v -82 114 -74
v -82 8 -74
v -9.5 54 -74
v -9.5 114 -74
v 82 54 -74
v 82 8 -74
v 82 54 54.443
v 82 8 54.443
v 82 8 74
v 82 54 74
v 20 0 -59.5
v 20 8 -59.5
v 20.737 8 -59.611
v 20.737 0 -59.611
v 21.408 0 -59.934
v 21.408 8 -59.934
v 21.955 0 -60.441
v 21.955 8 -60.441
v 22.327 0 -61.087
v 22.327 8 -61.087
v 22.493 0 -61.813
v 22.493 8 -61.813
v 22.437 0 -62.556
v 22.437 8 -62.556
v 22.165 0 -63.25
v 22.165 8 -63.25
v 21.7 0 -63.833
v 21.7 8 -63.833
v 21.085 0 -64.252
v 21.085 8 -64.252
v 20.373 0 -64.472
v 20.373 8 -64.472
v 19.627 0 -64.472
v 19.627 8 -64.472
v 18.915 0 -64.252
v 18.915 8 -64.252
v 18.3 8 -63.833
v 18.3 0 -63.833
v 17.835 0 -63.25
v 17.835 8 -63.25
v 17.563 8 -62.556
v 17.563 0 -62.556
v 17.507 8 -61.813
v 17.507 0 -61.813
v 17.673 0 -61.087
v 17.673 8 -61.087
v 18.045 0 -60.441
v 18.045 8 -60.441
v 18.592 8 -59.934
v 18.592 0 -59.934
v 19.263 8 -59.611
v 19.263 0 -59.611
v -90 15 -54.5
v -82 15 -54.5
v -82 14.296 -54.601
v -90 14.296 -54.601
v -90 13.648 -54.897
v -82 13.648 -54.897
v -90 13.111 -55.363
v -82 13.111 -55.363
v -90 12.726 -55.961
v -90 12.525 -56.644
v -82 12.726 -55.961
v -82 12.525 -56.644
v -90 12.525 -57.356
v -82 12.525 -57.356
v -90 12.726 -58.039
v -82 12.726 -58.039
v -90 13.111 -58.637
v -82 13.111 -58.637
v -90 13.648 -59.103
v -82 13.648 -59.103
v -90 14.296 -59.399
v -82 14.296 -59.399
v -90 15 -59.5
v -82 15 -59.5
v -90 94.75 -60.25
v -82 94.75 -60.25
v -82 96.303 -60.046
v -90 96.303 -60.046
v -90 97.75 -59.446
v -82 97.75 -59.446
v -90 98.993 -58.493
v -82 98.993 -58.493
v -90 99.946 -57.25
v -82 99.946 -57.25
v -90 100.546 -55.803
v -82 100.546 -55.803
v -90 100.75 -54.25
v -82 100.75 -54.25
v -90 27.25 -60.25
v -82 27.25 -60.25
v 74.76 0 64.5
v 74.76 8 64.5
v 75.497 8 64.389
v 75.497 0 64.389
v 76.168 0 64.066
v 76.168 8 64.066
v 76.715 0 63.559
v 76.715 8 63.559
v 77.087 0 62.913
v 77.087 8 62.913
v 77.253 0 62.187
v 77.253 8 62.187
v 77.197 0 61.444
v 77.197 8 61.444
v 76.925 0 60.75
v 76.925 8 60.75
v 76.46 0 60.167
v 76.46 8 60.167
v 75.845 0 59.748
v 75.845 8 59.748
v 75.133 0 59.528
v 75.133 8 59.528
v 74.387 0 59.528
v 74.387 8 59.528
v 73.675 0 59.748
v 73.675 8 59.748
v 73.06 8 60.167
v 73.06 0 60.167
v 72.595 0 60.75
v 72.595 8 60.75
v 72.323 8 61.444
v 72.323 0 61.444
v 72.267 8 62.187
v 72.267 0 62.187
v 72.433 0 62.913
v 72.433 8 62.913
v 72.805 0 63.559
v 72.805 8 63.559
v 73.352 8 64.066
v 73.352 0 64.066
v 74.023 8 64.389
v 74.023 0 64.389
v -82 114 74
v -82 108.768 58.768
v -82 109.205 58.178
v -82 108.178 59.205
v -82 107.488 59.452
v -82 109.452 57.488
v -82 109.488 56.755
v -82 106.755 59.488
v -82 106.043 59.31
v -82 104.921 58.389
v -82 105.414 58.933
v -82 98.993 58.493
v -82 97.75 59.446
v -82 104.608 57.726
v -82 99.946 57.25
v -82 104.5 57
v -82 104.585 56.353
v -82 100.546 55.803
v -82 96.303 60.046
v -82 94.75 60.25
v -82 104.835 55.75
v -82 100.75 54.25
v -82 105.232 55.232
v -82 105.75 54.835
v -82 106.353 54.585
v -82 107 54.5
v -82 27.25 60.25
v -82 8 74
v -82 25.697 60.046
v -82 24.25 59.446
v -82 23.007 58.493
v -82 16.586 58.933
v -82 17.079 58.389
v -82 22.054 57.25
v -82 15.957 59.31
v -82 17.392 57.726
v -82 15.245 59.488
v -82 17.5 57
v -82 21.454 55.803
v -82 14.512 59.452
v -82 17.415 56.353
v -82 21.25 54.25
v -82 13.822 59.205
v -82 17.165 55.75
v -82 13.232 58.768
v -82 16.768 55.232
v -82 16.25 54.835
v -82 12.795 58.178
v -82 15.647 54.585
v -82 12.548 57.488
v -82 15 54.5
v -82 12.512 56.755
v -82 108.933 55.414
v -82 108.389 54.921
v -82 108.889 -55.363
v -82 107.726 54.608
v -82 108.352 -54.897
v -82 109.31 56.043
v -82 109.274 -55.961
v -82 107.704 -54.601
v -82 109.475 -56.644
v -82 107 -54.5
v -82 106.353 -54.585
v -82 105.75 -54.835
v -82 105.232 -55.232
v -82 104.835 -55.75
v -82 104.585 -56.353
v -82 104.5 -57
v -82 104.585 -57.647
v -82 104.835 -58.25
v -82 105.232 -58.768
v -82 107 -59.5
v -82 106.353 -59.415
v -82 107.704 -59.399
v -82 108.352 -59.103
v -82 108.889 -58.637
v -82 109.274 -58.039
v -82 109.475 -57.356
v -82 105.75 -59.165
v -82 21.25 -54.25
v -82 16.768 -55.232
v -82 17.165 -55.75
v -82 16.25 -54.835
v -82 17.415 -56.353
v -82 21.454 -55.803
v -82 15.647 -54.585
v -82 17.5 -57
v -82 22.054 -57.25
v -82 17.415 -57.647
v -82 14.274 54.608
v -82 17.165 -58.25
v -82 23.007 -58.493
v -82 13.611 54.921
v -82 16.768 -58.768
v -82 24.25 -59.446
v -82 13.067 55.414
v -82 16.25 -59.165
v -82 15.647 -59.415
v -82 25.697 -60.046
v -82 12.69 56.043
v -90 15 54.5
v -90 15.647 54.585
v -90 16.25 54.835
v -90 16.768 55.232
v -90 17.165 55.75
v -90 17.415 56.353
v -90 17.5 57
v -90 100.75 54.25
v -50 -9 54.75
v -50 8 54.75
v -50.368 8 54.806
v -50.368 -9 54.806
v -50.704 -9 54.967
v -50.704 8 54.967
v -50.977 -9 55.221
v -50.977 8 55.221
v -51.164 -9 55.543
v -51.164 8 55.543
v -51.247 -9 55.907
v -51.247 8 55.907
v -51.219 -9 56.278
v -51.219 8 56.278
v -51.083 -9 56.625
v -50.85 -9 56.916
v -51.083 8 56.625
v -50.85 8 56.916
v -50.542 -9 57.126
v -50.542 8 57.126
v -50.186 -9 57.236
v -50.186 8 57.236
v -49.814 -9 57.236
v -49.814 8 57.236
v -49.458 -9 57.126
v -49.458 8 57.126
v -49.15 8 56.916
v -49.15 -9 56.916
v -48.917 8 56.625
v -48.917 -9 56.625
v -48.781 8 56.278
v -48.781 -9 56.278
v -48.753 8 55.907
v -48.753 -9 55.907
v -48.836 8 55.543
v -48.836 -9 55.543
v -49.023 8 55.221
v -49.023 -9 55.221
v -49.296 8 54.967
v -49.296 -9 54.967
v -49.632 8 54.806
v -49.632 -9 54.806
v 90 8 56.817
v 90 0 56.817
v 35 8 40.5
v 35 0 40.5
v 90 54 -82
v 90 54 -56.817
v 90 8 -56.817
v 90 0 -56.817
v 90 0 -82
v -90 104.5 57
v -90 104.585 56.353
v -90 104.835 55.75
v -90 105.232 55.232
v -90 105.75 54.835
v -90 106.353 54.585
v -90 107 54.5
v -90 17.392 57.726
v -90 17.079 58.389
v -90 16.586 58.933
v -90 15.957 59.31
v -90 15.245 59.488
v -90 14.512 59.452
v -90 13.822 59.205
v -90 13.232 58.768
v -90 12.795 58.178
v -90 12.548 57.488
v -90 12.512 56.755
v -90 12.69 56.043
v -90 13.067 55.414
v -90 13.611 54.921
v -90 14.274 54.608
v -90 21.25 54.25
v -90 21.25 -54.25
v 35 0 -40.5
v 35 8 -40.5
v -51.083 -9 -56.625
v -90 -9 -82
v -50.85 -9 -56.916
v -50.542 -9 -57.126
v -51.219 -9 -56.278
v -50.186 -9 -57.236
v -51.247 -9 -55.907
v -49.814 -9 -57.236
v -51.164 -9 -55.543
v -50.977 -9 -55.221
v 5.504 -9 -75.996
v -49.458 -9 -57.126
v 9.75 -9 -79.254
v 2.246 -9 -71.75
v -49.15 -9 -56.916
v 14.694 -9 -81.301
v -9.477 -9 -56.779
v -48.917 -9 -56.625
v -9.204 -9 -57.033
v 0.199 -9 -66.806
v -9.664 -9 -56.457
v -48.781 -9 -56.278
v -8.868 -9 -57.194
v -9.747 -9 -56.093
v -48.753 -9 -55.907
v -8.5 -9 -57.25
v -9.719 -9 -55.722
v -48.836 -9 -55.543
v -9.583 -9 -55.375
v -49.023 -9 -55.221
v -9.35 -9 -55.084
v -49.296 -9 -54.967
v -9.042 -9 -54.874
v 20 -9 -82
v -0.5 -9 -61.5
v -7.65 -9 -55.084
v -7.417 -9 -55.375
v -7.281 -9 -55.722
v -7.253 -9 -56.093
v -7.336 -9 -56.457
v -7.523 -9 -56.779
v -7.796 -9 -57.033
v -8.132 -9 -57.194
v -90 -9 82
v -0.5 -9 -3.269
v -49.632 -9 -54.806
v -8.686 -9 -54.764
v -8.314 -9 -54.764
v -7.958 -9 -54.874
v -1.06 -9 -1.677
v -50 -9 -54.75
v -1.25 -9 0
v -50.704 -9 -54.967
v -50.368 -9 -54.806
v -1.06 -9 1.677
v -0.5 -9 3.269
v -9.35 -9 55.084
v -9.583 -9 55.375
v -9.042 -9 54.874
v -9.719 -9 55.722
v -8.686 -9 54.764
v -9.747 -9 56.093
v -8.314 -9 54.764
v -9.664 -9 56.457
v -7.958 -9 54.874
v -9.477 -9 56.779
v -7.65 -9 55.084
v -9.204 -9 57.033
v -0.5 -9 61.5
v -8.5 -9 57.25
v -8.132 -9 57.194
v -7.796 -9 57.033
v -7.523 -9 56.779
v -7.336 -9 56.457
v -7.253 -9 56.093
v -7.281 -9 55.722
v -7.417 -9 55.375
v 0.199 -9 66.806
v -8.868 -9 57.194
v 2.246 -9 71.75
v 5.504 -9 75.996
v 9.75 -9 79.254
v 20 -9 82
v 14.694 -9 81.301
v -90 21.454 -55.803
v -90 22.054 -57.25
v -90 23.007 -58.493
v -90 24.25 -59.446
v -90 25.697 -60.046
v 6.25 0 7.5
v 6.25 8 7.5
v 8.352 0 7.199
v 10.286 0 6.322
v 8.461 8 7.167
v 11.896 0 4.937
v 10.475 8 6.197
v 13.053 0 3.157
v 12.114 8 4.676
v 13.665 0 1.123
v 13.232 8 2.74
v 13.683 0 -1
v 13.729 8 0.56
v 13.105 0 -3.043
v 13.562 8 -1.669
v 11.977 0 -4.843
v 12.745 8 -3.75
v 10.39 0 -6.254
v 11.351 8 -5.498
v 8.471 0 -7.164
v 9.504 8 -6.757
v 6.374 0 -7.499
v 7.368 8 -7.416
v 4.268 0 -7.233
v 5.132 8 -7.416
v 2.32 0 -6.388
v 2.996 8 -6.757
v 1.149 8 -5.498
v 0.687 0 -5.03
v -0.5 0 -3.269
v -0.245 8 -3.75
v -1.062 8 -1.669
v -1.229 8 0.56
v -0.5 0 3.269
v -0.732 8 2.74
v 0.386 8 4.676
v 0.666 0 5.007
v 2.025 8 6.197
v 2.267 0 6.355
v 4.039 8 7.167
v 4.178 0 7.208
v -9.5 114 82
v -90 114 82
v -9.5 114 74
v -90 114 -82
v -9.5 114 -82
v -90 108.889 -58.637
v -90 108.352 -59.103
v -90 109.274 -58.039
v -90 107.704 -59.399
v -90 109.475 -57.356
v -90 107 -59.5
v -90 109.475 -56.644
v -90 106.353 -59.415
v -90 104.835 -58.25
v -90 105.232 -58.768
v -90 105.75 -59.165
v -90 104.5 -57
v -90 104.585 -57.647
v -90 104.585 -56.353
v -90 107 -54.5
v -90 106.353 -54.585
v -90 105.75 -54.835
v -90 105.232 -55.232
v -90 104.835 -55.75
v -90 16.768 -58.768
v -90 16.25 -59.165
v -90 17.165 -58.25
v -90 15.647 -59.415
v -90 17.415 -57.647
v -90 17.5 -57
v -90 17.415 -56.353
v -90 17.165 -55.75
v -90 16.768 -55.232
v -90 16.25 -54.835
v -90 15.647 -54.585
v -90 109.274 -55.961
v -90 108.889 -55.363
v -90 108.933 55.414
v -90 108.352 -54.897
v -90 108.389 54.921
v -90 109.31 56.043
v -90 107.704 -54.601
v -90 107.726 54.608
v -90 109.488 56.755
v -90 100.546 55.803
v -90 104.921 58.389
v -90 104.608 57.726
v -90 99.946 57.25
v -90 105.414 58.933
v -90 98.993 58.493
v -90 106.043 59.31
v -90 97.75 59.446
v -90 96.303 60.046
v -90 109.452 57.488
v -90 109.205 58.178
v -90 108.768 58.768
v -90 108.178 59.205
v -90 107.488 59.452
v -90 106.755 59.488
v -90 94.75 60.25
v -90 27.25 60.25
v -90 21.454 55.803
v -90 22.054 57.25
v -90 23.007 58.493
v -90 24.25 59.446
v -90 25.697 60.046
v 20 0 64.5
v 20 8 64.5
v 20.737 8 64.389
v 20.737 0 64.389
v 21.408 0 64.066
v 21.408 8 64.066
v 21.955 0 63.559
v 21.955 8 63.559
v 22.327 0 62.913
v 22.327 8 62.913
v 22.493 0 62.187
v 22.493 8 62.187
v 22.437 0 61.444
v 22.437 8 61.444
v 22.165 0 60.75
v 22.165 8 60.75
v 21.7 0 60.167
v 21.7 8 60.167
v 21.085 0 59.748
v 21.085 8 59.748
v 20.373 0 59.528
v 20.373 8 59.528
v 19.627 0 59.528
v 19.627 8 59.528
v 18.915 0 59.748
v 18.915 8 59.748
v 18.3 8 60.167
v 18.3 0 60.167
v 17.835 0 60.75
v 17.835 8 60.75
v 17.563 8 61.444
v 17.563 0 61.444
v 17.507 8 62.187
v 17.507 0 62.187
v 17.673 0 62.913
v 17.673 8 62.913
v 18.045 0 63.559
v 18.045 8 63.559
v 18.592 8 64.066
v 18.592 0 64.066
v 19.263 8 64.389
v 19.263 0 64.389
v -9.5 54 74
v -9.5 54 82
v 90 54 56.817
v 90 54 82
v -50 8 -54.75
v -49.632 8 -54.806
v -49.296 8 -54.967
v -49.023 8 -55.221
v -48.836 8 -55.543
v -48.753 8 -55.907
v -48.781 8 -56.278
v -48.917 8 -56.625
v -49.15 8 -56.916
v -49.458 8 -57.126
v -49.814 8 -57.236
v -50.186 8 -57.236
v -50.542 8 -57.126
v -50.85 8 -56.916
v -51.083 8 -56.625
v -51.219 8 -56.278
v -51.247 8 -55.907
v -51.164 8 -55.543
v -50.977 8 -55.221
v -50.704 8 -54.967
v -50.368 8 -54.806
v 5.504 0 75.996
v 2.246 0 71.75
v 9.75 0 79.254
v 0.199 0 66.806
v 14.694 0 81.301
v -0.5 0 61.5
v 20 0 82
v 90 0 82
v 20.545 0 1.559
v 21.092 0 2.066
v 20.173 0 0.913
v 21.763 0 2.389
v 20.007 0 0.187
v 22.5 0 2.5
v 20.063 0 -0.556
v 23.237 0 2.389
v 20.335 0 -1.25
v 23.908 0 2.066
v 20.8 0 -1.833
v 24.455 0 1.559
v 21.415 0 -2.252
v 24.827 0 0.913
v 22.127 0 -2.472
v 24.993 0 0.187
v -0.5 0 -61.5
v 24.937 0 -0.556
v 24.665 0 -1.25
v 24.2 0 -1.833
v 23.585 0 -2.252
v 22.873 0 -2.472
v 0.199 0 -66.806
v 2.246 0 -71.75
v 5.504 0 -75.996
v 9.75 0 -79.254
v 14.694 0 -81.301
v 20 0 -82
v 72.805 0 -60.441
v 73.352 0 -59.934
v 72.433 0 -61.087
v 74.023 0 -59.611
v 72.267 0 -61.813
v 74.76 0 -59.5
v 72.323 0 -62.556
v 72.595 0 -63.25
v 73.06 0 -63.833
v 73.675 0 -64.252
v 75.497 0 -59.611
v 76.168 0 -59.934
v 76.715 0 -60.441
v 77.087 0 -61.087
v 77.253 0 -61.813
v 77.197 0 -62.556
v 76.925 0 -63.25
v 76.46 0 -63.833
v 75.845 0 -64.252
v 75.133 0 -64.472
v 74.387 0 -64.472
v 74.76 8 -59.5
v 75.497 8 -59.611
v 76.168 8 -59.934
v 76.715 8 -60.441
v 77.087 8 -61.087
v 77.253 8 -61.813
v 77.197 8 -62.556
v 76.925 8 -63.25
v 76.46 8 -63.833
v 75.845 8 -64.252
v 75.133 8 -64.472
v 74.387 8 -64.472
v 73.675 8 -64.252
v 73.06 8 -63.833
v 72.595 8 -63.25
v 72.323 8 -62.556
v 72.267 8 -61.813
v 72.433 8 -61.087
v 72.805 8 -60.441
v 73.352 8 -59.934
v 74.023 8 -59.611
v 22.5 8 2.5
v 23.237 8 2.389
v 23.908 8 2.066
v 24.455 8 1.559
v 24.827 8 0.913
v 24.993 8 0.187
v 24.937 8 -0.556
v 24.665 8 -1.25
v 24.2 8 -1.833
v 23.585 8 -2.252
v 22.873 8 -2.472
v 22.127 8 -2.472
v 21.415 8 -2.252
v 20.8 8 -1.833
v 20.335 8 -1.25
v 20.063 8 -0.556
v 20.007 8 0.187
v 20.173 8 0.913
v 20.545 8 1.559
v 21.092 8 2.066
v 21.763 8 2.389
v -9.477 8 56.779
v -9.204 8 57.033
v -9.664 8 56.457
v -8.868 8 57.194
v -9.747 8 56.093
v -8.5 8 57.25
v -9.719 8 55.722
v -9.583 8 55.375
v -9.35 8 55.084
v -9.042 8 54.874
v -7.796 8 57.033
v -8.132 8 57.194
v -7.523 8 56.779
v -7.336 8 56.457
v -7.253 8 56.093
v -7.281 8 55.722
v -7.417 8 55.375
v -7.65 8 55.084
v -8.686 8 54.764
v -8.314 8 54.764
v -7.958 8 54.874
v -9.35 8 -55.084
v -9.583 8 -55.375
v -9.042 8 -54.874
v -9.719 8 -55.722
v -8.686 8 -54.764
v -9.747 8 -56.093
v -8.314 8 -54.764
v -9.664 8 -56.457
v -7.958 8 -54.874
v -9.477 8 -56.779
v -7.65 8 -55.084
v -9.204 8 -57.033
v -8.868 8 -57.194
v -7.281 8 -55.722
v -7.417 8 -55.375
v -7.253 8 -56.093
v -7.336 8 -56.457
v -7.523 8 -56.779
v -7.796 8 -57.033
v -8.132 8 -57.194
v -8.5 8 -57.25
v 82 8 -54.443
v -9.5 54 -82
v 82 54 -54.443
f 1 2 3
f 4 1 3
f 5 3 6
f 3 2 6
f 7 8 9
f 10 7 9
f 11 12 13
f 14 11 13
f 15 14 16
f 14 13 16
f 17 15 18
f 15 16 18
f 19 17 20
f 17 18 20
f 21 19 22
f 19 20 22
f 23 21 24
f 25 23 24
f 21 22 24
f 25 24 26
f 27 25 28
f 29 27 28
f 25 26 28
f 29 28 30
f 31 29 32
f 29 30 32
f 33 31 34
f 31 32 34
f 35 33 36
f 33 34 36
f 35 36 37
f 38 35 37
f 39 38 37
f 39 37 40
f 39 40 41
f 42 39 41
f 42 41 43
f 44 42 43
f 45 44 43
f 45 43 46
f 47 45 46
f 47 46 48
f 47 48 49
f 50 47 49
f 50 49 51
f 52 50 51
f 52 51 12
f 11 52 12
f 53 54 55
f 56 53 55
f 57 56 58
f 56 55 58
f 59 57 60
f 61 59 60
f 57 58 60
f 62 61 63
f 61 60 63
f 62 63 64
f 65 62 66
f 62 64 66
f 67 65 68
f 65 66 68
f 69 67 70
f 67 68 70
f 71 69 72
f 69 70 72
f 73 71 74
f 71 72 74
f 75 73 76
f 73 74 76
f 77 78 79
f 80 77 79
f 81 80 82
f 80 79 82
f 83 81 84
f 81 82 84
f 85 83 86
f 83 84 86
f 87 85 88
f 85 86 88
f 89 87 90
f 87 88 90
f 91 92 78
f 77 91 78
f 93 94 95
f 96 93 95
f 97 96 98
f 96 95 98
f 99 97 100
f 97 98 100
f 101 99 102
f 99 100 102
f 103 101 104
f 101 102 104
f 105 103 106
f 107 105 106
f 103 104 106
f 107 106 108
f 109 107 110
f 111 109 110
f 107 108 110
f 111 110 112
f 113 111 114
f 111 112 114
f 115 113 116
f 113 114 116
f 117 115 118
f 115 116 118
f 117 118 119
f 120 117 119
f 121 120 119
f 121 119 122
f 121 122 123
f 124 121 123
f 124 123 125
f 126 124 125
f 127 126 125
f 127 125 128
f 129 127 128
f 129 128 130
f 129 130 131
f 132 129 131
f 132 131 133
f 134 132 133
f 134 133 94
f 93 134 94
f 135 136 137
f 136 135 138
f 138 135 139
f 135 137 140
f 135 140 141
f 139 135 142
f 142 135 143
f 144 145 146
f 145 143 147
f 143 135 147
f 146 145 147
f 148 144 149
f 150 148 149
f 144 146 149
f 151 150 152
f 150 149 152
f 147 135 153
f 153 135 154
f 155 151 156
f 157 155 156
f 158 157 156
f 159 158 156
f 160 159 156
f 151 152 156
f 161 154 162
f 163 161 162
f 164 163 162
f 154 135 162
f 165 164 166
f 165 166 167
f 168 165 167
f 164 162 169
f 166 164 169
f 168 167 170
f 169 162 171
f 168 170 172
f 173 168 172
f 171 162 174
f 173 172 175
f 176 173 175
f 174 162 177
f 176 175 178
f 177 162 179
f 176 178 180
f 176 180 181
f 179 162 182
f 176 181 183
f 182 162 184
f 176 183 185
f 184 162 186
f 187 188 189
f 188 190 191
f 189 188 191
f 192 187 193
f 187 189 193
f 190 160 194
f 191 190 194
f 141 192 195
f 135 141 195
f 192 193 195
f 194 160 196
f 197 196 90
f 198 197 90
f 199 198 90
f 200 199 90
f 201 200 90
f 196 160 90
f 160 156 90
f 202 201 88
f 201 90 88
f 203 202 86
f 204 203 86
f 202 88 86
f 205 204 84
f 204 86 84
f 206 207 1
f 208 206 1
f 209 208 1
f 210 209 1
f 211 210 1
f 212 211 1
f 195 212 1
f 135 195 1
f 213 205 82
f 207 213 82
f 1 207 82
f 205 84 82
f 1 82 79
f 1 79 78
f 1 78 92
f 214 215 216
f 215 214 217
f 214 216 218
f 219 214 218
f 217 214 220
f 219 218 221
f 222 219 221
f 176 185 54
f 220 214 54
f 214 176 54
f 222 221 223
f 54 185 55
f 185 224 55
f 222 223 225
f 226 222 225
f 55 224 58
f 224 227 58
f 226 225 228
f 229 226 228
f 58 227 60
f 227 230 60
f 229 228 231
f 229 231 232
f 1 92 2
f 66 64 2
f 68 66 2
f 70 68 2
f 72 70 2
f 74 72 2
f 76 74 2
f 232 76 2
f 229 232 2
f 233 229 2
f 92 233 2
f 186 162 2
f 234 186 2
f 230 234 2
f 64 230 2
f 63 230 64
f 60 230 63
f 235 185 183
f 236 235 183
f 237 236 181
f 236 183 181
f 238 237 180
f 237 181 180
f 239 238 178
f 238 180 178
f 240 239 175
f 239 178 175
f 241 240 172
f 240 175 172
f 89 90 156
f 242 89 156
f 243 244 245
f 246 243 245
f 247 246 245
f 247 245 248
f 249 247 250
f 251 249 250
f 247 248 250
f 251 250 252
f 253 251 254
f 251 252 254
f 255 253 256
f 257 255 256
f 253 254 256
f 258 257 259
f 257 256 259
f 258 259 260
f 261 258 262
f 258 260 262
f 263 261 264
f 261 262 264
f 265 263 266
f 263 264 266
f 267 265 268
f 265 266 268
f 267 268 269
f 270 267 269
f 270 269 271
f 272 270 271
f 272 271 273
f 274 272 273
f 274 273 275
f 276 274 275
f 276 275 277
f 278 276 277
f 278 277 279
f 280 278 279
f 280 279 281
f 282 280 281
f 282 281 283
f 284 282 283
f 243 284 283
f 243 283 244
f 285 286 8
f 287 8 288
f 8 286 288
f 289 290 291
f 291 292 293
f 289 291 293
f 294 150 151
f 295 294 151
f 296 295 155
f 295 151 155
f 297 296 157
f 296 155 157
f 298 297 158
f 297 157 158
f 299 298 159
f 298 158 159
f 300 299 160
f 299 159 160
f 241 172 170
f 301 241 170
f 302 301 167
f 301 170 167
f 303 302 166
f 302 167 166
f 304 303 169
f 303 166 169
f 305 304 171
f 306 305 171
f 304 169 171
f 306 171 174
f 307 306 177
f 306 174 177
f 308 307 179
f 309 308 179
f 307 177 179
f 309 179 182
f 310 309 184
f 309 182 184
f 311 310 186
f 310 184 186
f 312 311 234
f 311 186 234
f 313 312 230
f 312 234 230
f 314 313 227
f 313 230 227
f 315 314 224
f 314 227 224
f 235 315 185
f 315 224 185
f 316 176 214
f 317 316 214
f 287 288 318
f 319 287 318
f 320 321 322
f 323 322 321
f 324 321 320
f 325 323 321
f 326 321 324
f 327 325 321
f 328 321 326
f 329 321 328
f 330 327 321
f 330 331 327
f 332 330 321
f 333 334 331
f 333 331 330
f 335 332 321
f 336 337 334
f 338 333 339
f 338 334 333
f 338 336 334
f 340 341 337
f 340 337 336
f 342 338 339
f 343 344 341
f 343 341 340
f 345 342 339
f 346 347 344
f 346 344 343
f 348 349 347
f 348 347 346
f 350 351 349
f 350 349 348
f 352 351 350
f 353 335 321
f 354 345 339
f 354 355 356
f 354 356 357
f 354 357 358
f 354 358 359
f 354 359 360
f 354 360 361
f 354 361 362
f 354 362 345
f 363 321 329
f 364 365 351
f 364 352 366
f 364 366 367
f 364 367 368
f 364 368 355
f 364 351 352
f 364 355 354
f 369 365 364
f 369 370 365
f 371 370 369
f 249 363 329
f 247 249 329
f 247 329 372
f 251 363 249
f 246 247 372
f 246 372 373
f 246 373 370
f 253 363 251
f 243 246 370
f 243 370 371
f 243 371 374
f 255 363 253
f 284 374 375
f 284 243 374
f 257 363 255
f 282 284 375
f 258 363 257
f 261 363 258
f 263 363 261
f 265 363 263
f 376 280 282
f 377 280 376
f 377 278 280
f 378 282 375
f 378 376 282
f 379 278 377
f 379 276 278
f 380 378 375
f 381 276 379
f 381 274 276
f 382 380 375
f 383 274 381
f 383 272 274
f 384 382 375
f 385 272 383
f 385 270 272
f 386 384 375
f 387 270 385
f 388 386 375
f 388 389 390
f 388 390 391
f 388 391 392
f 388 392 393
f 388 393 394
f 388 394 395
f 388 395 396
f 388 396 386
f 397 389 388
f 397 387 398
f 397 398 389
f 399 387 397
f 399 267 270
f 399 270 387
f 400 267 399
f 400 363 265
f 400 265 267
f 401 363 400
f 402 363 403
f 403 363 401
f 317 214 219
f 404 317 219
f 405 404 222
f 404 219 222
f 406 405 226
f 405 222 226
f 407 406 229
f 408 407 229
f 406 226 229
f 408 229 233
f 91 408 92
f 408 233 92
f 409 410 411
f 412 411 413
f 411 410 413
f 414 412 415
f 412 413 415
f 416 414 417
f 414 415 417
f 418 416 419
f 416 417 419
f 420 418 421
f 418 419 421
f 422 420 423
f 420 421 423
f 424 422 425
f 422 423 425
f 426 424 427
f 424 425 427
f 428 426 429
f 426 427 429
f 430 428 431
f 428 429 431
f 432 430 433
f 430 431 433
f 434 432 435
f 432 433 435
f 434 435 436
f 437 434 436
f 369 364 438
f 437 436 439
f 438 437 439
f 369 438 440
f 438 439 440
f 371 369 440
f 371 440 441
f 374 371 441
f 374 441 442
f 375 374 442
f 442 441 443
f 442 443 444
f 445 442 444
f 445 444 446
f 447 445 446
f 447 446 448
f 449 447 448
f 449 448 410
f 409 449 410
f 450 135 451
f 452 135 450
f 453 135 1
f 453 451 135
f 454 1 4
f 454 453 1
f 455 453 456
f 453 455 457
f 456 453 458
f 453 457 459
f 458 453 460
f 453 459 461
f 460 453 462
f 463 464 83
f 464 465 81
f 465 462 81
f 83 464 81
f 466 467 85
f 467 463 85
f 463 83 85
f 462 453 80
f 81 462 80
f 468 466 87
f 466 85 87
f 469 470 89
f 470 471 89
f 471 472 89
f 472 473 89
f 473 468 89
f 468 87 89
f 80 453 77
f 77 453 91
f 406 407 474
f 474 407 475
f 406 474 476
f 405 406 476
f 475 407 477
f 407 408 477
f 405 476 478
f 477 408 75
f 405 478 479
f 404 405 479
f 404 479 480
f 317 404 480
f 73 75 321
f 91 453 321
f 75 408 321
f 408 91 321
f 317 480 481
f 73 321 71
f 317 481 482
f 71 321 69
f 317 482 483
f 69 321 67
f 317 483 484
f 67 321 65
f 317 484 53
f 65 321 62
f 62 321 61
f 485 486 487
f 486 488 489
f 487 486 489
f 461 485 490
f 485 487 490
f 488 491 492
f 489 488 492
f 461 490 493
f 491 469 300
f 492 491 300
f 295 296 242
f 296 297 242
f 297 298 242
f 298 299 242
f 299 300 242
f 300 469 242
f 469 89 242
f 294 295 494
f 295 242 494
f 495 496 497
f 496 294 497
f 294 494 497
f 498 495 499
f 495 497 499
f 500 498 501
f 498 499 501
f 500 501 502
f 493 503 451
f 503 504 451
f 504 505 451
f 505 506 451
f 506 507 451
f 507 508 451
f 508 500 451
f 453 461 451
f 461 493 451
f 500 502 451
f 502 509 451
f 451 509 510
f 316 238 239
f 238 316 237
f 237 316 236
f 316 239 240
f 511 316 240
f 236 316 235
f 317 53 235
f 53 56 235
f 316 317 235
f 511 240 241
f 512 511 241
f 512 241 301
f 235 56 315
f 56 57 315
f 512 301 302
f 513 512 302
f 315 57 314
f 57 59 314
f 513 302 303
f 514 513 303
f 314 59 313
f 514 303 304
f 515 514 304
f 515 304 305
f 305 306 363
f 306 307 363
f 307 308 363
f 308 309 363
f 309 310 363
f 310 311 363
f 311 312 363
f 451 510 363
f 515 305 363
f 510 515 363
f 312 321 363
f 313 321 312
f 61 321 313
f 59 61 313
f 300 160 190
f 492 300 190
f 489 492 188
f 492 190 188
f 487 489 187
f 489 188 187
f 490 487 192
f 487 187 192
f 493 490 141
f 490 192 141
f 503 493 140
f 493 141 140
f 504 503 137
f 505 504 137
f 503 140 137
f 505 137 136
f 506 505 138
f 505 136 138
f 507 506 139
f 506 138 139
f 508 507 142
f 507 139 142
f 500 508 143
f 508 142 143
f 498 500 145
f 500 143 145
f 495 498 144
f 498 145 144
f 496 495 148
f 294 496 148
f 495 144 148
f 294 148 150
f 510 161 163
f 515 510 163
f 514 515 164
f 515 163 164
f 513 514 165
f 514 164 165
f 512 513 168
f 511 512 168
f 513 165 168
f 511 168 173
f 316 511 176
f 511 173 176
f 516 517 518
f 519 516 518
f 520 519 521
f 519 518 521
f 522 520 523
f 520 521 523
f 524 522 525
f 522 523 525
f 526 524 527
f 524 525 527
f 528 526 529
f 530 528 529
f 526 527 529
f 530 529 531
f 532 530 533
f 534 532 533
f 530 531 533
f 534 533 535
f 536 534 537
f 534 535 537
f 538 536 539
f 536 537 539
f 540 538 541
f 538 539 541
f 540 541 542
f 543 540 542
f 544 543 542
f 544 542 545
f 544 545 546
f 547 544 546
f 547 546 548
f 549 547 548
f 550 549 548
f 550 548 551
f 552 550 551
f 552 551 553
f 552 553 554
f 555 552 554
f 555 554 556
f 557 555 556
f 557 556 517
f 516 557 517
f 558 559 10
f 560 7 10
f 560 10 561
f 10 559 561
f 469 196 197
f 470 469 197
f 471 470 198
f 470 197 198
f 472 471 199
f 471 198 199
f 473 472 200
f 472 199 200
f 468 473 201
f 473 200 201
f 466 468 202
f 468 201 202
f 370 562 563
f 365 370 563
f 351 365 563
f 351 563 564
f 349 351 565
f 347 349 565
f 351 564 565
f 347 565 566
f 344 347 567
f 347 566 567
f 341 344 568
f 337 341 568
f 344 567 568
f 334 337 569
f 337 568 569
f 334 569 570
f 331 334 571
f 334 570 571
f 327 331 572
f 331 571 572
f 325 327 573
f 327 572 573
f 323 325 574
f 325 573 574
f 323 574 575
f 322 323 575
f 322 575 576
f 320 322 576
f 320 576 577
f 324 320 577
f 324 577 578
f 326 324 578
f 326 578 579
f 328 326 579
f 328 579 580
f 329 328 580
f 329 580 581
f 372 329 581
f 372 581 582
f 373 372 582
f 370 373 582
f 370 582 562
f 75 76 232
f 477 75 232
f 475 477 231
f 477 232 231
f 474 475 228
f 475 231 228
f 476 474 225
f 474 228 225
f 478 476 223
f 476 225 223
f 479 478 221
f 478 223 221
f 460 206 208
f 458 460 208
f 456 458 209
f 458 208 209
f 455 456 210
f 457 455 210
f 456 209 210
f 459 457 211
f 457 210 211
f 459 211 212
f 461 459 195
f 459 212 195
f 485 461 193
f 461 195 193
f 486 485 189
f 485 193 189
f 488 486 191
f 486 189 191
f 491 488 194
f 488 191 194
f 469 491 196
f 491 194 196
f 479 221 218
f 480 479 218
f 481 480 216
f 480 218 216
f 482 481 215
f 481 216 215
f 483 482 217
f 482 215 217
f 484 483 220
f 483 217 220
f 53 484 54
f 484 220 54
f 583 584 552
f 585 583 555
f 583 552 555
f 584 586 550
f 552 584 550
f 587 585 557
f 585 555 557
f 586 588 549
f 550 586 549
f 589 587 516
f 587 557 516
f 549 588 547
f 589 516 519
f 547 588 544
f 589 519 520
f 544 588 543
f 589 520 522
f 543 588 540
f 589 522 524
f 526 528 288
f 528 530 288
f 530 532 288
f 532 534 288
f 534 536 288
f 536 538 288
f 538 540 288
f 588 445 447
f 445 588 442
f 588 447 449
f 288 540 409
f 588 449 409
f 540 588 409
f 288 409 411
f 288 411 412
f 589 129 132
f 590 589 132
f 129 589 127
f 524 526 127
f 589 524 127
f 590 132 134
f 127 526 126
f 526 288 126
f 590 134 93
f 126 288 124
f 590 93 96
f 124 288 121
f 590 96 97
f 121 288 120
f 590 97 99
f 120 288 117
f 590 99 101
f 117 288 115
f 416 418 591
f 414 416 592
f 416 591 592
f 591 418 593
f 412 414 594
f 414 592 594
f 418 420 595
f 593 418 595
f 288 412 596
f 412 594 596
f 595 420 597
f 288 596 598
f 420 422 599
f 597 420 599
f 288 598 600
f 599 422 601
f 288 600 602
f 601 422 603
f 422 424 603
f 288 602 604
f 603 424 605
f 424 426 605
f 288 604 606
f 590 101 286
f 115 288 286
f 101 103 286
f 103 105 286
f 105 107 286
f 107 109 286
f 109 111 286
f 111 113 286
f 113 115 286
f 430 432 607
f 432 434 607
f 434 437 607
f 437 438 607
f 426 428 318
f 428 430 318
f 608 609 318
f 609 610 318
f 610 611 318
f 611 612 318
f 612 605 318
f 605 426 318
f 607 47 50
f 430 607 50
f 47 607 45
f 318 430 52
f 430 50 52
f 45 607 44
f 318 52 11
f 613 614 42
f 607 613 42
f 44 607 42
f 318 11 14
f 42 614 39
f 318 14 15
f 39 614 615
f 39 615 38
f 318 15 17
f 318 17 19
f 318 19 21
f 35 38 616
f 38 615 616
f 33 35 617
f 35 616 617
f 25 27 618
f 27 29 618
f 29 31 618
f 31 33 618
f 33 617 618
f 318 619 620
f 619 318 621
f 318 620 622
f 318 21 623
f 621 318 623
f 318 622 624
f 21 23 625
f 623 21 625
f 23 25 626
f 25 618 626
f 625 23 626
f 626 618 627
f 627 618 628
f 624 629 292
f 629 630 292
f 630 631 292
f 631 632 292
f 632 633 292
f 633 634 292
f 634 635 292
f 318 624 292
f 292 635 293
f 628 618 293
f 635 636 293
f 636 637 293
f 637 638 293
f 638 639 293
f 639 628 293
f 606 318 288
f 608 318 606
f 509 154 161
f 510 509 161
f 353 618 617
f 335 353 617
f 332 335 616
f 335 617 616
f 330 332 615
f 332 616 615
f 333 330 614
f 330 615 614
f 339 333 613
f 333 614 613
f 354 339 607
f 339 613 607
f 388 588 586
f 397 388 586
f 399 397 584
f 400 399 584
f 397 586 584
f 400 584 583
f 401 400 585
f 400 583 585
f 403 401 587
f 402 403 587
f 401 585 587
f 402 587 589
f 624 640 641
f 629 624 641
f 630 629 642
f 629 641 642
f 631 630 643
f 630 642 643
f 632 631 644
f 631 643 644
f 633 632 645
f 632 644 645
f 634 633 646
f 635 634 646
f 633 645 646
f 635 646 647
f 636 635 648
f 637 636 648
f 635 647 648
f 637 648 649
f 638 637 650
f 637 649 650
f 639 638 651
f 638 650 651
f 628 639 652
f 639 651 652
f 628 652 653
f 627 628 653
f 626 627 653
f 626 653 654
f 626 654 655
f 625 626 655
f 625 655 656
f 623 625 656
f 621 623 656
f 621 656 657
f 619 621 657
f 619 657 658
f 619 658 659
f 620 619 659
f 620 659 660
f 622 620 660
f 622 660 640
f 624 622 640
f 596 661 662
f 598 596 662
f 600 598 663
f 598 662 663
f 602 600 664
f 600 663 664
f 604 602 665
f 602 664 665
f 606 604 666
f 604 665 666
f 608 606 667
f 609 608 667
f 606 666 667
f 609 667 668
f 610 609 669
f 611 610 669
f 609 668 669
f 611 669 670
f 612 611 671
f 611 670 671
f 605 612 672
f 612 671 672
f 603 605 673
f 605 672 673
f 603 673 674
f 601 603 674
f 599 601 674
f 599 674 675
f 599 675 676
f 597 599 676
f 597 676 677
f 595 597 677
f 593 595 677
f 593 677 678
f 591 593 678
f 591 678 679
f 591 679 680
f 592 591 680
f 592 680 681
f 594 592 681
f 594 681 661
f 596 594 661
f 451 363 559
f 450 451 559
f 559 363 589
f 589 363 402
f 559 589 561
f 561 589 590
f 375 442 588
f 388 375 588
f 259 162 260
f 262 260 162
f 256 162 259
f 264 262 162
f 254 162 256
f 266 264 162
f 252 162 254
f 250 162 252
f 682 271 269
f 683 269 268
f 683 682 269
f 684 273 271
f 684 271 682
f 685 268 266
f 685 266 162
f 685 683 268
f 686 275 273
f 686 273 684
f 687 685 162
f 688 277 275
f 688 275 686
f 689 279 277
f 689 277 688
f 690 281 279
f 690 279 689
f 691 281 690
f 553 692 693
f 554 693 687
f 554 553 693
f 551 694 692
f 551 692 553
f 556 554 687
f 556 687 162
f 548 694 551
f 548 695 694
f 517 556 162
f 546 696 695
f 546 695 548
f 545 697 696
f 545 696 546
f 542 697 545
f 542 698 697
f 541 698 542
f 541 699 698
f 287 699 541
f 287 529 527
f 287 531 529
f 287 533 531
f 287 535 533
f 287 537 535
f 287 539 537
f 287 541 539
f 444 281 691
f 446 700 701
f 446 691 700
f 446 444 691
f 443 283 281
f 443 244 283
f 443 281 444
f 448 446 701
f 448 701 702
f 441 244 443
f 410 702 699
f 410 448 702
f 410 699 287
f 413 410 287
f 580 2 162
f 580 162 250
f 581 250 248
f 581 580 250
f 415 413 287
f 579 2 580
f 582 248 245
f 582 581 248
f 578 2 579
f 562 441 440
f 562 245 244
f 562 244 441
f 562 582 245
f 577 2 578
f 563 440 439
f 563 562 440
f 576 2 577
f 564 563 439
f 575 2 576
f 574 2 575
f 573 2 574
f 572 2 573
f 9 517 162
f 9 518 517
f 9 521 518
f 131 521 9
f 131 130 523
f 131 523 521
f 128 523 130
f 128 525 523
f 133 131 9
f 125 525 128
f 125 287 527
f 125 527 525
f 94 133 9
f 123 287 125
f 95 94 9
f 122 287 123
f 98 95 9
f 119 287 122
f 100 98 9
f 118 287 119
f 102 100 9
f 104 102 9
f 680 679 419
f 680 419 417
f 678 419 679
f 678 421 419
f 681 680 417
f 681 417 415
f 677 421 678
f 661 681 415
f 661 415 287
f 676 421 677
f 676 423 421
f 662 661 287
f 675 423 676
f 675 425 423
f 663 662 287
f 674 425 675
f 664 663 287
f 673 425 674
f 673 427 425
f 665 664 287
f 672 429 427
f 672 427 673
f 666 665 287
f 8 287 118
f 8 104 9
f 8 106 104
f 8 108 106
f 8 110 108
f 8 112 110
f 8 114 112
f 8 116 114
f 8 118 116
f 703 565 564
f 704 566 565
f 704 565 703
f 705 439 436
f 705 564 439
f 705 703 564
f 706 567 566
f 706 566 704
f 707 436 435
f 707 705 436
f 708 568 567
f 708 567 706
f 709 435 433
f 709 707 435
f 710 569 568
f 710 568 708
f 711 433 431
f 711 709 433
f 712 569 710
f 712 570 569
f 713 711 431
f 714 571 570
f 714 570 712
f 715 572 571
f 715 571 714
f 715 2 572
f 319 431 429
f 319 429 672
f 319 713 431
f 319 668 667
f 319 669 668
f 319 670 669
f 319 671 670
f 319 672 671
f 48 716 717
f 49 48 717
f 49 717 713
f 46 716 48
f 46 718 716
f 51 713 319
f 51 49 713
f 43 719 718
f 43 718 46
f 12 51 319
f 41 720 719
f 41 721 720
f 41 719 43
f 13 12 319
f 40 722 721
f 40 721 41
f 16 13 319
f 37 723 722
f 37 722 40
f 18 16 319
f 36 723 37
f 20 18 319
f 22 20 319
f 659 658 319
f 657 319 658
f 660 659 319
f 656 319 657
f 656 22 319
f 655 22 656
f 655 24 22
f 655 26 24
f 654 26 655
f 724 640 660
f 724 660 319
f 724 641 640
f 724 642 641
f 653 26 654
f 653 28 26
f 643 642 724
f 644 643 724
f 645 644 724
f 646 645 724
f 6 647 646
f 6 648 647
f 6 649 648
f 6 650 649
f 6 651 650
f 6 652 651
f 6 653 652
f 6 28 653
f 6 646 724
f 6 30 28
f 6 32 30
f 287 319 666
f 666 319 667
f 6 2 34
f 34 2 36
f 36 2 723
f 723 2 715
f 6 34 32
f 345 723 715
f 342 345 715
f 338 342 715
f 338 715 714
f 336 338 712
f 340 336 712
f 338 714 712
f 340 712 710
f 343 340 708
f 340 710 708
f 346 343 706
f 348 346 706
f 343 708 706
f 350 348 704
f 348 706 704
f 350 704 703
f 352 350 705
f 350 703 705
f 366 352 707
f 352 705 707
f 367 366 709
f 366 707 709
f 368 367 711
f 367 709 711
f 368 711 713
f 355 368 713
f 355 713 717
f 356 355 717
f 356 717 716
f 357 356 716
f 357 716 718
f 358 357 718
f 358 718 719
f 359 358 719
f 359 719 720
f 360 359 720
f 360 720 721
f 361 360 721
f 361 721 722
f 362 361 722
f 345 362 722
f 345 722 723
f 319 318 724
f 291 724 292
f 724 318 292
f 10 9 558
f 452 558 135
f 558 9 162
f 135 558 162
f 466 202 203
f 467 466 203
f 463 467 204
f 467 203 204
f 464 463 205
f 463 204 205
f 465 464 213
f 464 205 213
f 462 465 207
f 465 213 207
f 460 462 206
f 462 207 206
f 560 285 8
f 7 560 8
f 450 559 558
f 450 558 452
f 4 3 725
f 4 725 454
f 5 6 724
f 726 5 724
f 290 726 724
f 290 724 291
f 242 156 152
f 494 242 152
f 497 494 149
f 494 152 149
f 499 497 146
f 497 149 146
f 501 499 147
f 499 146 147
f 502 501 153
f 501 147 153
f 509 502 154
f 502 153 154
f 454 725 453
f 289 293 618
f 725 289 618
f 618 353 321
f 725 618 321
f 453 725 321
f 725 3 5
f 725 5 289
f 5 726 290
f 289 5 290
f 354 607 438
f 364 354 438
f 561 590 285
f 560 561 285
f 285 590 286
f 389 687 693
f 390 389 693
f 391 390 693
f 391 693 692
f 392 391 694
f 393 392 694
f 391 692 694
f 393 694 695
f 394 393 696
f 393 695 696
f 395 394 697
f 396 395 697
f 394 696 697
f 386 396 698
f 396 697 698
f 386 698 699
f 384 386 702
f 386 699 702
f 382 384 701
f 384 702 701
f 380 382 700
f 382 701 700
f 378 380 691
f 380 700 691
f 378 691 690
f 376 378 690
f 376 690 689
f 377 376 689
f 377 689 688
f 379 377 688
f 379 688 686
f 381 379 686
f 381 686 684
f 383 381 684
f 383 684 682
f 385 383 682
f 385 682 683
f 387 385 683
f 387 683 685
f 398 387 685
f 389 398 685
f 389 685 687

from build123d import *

# Parameters (mm, degrees)
BOSS_EXTRUDE1_DEPTH = 8
BOSS_EXTRUDE2_DEPTH = 9
BOSS_EXTRUDE3_DEPTH = 106
CUT_EXTRUDE1_REACH  = 163.431
SKETCH4_R           = 2.5
SKETCH4_R_2         = 7.5
CUT_EXTRUDE2_REACH  = 163.431
SKETCH5_R           = 1.25
SKETCH7_W           = 99.5
SKETCH7_H           = 60
CUT_EXTRUDE3_DEPTH  = 220.070764823
CUT_EXTRUDE4_REACH  = 224.045


with BuildPart() as part:
    # Sketch1 → Boss-Extrude1 (new body)
    with BuildSketch(Plane(origin=(0, 0, 0), x_dir=(1, 0, 0), z_dir=(0, 1, 0))):
        Polygon((35, 40.5), (90, 56.816666667), (90, 82), (-90, 82), (-90, -82), (90, -82), (90, -56.816666667), (35, -40.5), align=None)
    extrude(amount=BOSS_EXTRUDE1_DEPTH)

    # Sketch2 → Boss-Extrude2 (add)
    with BuildSketch(Plane.XZ):
        with BuildLine():
            ThreePointArc((-0.5, 61.5), (5.504310986, 75.995689014), (20, 82))
            Line((20, 82), (-90, 82))
            Line((-90, 82), (-90, -82))
            Line((-90, -82), (20, -82))
            ThreePointArc((20, -82), (5.504310986, -75.995689014), (-0.5, -61.5))
            Line((-0.5, -61.5), (-0.5, 61.5))
        make_face()
    extrude(amount=BOSS_EXTRUDE2_DEPTH)

    # Sketch3 → Boss-Extrude3 (add)
    with BuildSketch(Plane(origin=(0, 8, 0), x_dir=(1, 0, 0), z_dir=(0, 1, 0))):
        Polygon((90, 82), (-90, 82), (-90, -82), (90, -82), (90, -56.816666667), (82, -54.443333333), (82, -62.787955021), (82, -74), (-82, -74), (-82, 74), (82, 74), (82, 62.787955021), (82, 54.443333333), (90, 56.816666667), align=None)
    extrude(amount=BOSS_EXTRUDE3_DEPTH)

    # Sketch4 → Cut-Extrude1 (cut, up to next)
    with BuildSketch(Plane(origin=(0, 8, 0), x_dir=(1, 0, 0), z_dir=(0, 1, 0)), mode=Mode.PRIVATE) as cut_extrude1_sk1:
        with Locations(Location((74.76, 62, 0), (0, 0, 270))):
            Circle(SKETCH4_R)
    cut_extrude1_tool1 = extrude(cut_extrude1_sk1.sketch, amount=-CUT_EXTRUDE1_REACH, mode=Mode.PRIVATE) & part.part
    # Sketch4 → Cut-Extrude1 (cut, up to next)
    with BuildSketch(Plane(origin=(0, 8, 0), x_dir=(1, 0, 0), z_dir=(0, 1, 0)), mode=Mode.PRIVATE) as cut_extrude1_sk2:
        with Locations(Location((6.25, 0, 0), (0, 0, 270))):
            Circle(SKETCH4_R_2)
    cut_extrude1_tool2 = extrude(cut_extrude1_sk2.sketch, amount=-CUT_EXTRUDE1_REACH, mode=Mode.PRIVATE) & part.part
    # Sketch4 → Cut-Extrude1 (cut, up to next)
    with BuildSketch(Plane(origin=(0, 8, 0), x_dir=(1, 0, 0), z_dir=(0, 1, 0)), mode=Mode.PRIVATE) as cut_extrude1_sk3:
        with Locations(Location((22.5, 0, 0), (0, 0, 270))):
            Circle(SKETCH4_R)
    cut_extrude1_tool3 = extrude(cut_extrude1_sk3.sketch, amount=-CUT_EXTRUDE1_REACH, mode=Mode.PRIVATE) & part.part
    # Sketch4 → Cut-Extrude1 (cut, up to next)
    with BuildSketch(Plane(origin=(0, 8, 0), x_dir=(1, 0, 0), z_dir=(0, 1, 0)), mode=Mode.PRIVATE) as cut_extrude1_sk4:
        with Locations(Location((20, 62, 0), (0, 0, 270))):
            Circle(SKETCH4_R)
    cut_extrude1_tool4 = extrude(cut_extrude1_sk4.sketch, amount=-CUT_EXTRUDE1_REACH, mode=Mode.PRIVATE) & part.part
    # Sketch4 → Cut-Extrude1 (cut, up to next)
    with BuildSketch(Plane(origin=(0, 8, 0), x_dir=(1, 0, 0), z_dir=(0, 1, 0)), mode=Mode.PRIVATE) as cut_extrude1_sk5:
        with Locations(Location((20, -62, 0), (0, 0, 270))):
            Circle(SKETCH4_R)
    cut_extrude1_tool5 = extrude(cut_extrude1_sk5.sketch, amount=-CUT_EXTRUDE1_REACH, mode=Mode.PRIVATE) & part.part
    # Sketch4 → Cut-Extrude1 (cut, up to next)
    with BuildSketch(Plane(origin=(0, 8, 0), x_dir=(1, 0, 0), z_dir=(0, 1, 0)), mode=Mode.PRIVATE) as cut_extrude1_sk6:
        with Locations(Location((74.76, -62, 0), (0, 0, 270))):
            Circle(SKETCH4_R)
    cut_extrude1_tool6 = extrude(cut_extrude1_sk6.sketch, amount=-CUT_EXTRUDE1_REACH, mode=Mode.PRIVATE) & part.part
    add(cut_extrude1_tool1.solids().sort_by_distance((74.76, 8, -62))[0], mode=Mode.SUBTRACT)
    add(cut_extrude1_tool2.solids().sort_by_distance((6.25, 8, 0))[0], mode=Mode.SUBTRACT)
    add(cut_extrude1_tool3.solids().sort_by_distance((22.5, 8, 0))[0], mode=Mode.SUBTRACT)
    add(cut_extrude1_tool4.solids().sort_by_distance((20, 8, -62))[0], mode=Mode.SUBTRACT)
    add(cut_extrude1_tool5.solids().sort_by_distance((20, 8, 62))[0], mode=Mode.SUBTRACT)
    add(cut_extrude1_tool6.solids().sort_by_distance((74.76, 8, 62))[0], mode=Mode.SUBTRACT)

    # Sketch5 → Cut-Extrude2 (cut, up to next)
    with BuildSketch(Plane(origin=(0, 8, 0), x_dir=(1, 0, 0), z_dir=(0, 1, 0)), mode=Mode.PRIVATE) as cut_extrude2_sk1:
        with Locations(Location((-50, 56, 0), (0, 0, 270))):
            Circle(SKETCH5_R)
    cut_extrude2_tool1 = extrude(cut_extrude2_sk1.sketch, amount=-CUT_EXTRUDE2_REACH, mode=Mode.PRIVATE) & part.part
    # Sketch5 → Cut-Extrude2 (cut, up to next)
    with BuildSketch(Plane(origin=(0, 8, 0), x_dir=(1, 0, 0), z_dir=(0, 1, 0)), mode=Mode.PRIVATE) as cut_extrude2_sk2:
        with Locations(Location((-8.5, 56, 0), (0, 0, 90))):
            Circle(SKETCH5_R)
    cut_extrude2_tool2 = extrude(cut_extrude2_sk2.sketch, amount=-CUT_EXTRUDE2_REACH, mode=Mode.PRIVATE) & part.part
    # Sketch5 → Cut-Extrude2 (cut, up to next)
    with BuildSketch(Plane(origin=(0, 8, 0), x_dir=(1, 0, 0), z_dir=(0, 1, 0)), mode=Mode.PRIVATE) as cut_extrude2_sk3:
        with Locations(Location((-8.5, -56, 0), (0, 0, 270))):
            Circle(SKETCH5_R)
    cut_extrude2_tool3 = extrude(cut_extrude2_sk3.sketch, amount=-CUT_EXTRUDE2_REACH, mode=Mode.PRIVATE) & part.part
    # Sketch5 → Cut-Extrude2 (cut, up to next)
    with BuildSketch(Plane(origin=(0, 8, 0), x_dir=(1, 0, 0), z_dir=(0, 1, 0)), mode=Mode.PRIVATE) as cut_extrude2_sk4:
        with Locations(Location((-50, -56, 0), (0, 0, 90))):
            Circle(SKETCH5_R)
    cut_extrude2_tool4 = extrude(cut_extrude2_sk4.sketch, amount=-CUT_EXTRUDE2_REACH, mode=Mode.PRIVATE) & part.part
    add(cut_extrude2_tool1.solids().sort_by_distance((-50, 8, -56))[0], mode=Mode.SUBTRACT)
    add(cut_extrude2_tool2.solids().sort_by_distance((-8.5, 8, -56))[0], mode=Mode.SUBTRACT)
    add(cut_extrude2_tool3.solids().sort_by_distance((-8.5, 8, 56))[0], mode=Mode.SUBTRACT)
    add(cut_extrude2_tool4.solids().sort_by_distance((-50, 8, 56))[0], mode=Mode.SUBTRACT)

    # Sketch7 → Cut-Extrude3 (cut, through all)
    with BuildSketch(Plane.XY.offset(82)):
        with Locations((40.25, 84)):
            Rectangle(SKETCH7_W, SKETCH7_H)
    extrude(amount=-CUT_EXTRUDE3_DEPTH, mode=Mode.SUBTRACT)

    # Sketch8 → Cut-Extrude4 (cut, up to next)
    with BuildSketch(Plane(origin=(-82, 0, 0), x_dir=(0, 0, -1), z_dir=(1, 0, 0)), mode=Mode.PRIVATE) as cut_extrude4_sk1:
        with BuildLine():
            Line((-57, 104.5), (-57, 107))
            Line((-57, 107), (-54.5, 107))
            ThreePointArc((-54.5, 107), (-58.767766953, 108.767766953), (-57, 104.5))
        make_face()
    cut_extrude4_tool1 = extrude(cut_extrude4_sk1.sketch, amount=-CUT_EXTRUDE4_REACH, mode=Mode.PRIVATE) & part.part
    # Sketch8 → Cut-Extrude4 (cut, up to next)
    with BuildSketch(Plane(origin=(-82, 0, 0), x_dir=(0, 0, -1), z_dir=(1, 0, 0)), mode=Mode.PRIVATE) as cut_extrude4_sk2:
        with BuildLine():
            Line((-54.5, 107), (-57, 107))
            Line((-57, 107), (-57, 104.5))
            ThreePointArc((-57, 104.5), (-55.232233047, 105.232233047), (-54.5, 107))
        make_face()
    cut_extrude4_tool2 = extrude(cut_extrude4_sk2.sketch, amount=-CUT_EXTRUDE4_REACH, mode=Mode.PRIVATE) & part.part
    # Sketch8 → Cut-Extrude4 (cut, up to next)
    with BuildSketch(Plane(origin=(-82, 0, 0), x_dir=(0, 0, -1), z_dir=(1, 0, 0)), mode=Mode.PRIVATE) as cut_extrude4_sk3:
        with BuildLine():
            Line((-57, 104.5), (-57, 107))
            Line((-57, 107), (-54.5, 107))
            ThreePointArc((-54.5, 107), (-58.767766953, 108.767766953), (-57, 104.5))
        make_face()
    cut_extrude4_tool3 = extrude(cut_extrude4_sk3.sketch, amount=-CUT_EXTRUDE4_REACH, mode=Mode.PRIVATE) & part.part
    # Sketch8 → Cut-Extrude4 (cut, up to next)
    with BuildSketch(Plane(origin=(-82, 0, 0), x_dir=(0, 0, -1), z_dir=(1, 0, 0)), mode=Mode.PRIVATE) as cut_extrude4_sk4:
        with BuildLine():
            Line((-54.5, 107), (-57, 107))
            Line((-57, 107), (-57, 104.5))
            ThreePointArc((-57, 104.5), (-55.232233047, 105.232233047), (-54.5, 107))
        make_face()
    cut_extrude4_tool4 = extrude(cut_extrude4_sk4.sketch, amount=-CUT_EXTRUDE4_REACH, mode=Mode.PRIVATE) & part.part
    # Sketch8 → Cut-Extrude4 (cut, up to next)
    with BuildSketch(Plane(origin=(-82, 0, 0), x_dir=(0, 0, -1), z_dir=(1, 0, 0)), mode=Mode.PRIVATE) as cut_extrude4_sk5:
        with BuildLine():
            ThreePointArc((59.5, 107), (57, 109.5), (54.5, 107))
            Line((54.5, 107), (57, 107))
            Line((57, 107), (57, 104.5))
            ThreePointArc((57, 104.5), (58.767766953, 105.232233047), (59.5, 107))
        make_face()
    cut_extrude4_tool5 = extrude(cut_extrude4_sk5.sketch, amount=-CUT_EXTRUDE4_REACH, mode=Mode.PRIVATE) & part.part
    # Sketch8 → Cut-Extrude4 (cut, up to next)
    with BuildSketch(Plane(origin=(-82, 0, 0), x_dir=(0, 0, -1), z_dir=(1, 0, 0)), mode=Mode.PRIVATE) as cut_extrude4_sk6:
        with BuildLine():
            Line((57, 107), (54.5, 107))
            ThreePointArc((54.5, 107), (55.232233047, 105.232233047), (57, 104.5))
            Line((57, 104.5), (57, 107))
        make_face()
    cut_extrude4_tool6 = extrude(cut_extrude4_sk6.sketch, amount=-CUT_EXTRUDE4_REACH, mode=Mode.PRIVATE) & part.part
    # Sketch8 → Cut-Extrude4 (cut, up to next)
    with BuildSketch(Plane(origin=(-82, 0, 0), x_dir=(0, 0, -1), z_dir=(1, 0, 0)), mode=Mode.PRIVATE) as cut_extrude4_sk7:
        with BuildLine():
            ThreePointArc((59.5, 107), (57, 109.5), (54.5, 107))
            Line((54.5, 107), (57, 107))
            Line((57, 107), (57, 104.5))
            ThreePointArc((57, 104.5), (58.767766953, 105.232233047), (59.5, 107))
        make_face()
    cut_extrude4_tool7 = extrude(cut_extrude4_sk7.sketch, amount=-CUT_EXTRUDE4_REACH, mode=Mode.PRIVATE) & part.part
    # Sketch8 → Cut-Extrude4 (cut, up to next)
    with BuildSketch(Plane(origin=(-82, 0, 0), x_dir=(0, 0, -1), z_dir=(1, 0, 0)), mode=Mode.PRIVATE) as cut_extrude4_sk8:
        with BuildLine():
            Line((57, 107), (54.5, 107))
            ThreePointArc((54.5, 107), (55.232233047, 105.232233047), (57, 104.5))
            Line((57, 104.5), (57, 107))
        make_face()
    cut_extrude4_tool8 = extrude(cut_extrude4_sk8.sketch, amount=-CUT_EXTRUDE4_REACH, mode=Mode.PRIVATE) & part.part
    # Sketch8 → Cut-Extrude4 (cut, up to next)
    with BuildSketch(Plane(origin=(-82, 0, 0), x_dir=(0, 0, -1), z_dir=(1, 0, 0)), mode=Mode.PRIVATE) as cut_extrude4_sk9:
        with BuildLine():
            ThreePointArc((-54.5, 15), (-55.232233047, 16.767766953), (-57, 17.5))
            Line((-57, 17.5), (-57, 15))
            Line((-57, 15), (-54.5, 15))
        make_face()
    cut_extrude4_tool9 = extrude(cut_extrude4_sk9.sketch, amount=-CUT_EXTRUDE4_REACH, mode=Mode.PRIVATE) & part.part
    # Sketch8 → Cut-Extrude4 (cut, up to next)
    with BuildSketch(Plane(origin=(-82, 0, 0), x_dir=(0, 0, -1), z_dir=(1, 0, 0)), mode=Mode.PRIVATE) as cut_extrude4_sk10:
        with BuildLine():
            Line((-57, 15), (-57, 17.5))
            ThreePointArc((-57, 17.5), (-58.767766953, 13.232233047), (-54.5, 15))
            Line((-54.5, 15), (-57, 15))
        make_face()
    cut_extrude4_tool10 = extrude(cut_extrude4_sk10.sketch, amount=-CUT_EXTRUDE4_REACH, mode=Mode.PRIVATE) & part.part
    # Sketch8 → Cut-Extrude4 (cut, up to next)
    with BuildSketch(Plane(origin=(-82, 0, 0), x_dir=(0, 0, -1), z_dir=(1, 0, 0)), mode=Mode.PRIVATE) as cut_extrude4_sk11:
        with BuildLine():
            ThreePointArc((-54.5, 15), (-55.232233047, 16.767766953), (-57, 17.5))
            Line((-57, 17.5), (-57, 15))
            Line((-57, 15), (-54.5, 15))
        make_face()
    cut_extrude4_tool11 = extrude(cut_extrude4_sk11.sketch, amount=-CUT_EXTRUDE4_REACH, mode=Mode.PRIVATE) & part.part
    # Sketch8 → Cut-Extrude4 (cut, up to next)
    with BuildSketch(Plane(origin=(-82, 0, 0), x_dir=(0, 0, -1), z_dir=(1, 0, 0)), mode=Mode.PRIVATE) as cut_extrude4_sk12:
        with BuildLine():
            Line((-57, 15), (-57, 17.5))
            ThreePointArc((-57, 17.5), (-58.767766953, 13.232233047), (-54.5, 15))
            Line((-54.5, 15), (-57, 15))
        make_face()
    cut_extrude4_tool12 = extrude(cut_extrude4_sk12.sketch, amount=-CUT_EXTRUDE4_REACH, mode=Mode.PRIVATE) & part.part
    # Sketch8 → Cut-Extrude4 (cut, up to next)
    with BuildSketch(Plane(origin=(-82, 0, 0), x_dir=(0, 0, -1), z_dir=(1, 0, 0)), mode=Mode.PRIVATE) as cut_extrude4_sk13:
        with BuildLine():
            ThreePointArc((59.5, 15), (58.767766953, 16.767766953), (57, 17.5))
            Line((57, 17.5), (57, 15))
            Line((57, 15), (54.5, 15))
            ThreePointArc((54.5, 15), (57, 12.5), (59.5, 15))
        make_face()
    cut_extrude4_tool13 = extrude(cut_extrude4_sk13.sketch, amount=-CUT_EXTRUDE4_REACH, mode=Mode.PRIVATE) & part.part
    # Sketch8 → Cut-Extrude4 (cut, up to next)
    with BuildSketch(Plane(origin=(-82, 0, 0), x_dir=(0, 0, -1), z_dir=(1, 0, 0)), mode=Mode.PRIVATE) as cut_extrude4_sk14:
        with BuildLine():
            Line((57, 15), (57, 17.5))
            ThreePointArc((57, 17.5), (55.232233047, 16.767766953), (54.5, 15))
            Line((54.5, 15), (57, 15))
        make_face()
    cut_extrude4_tool14 = extrude(cut_extrude4_sk14.sketch, amount=-CUT_EXTRUDE4_REACH, mode=Mode.PRIVATE) & part.part
    # Sketch8 → Cut-Extrude4 (cut, up to next)
    with BuildSketch(Plane(origin=(-82, 0, 0), x_dir=(0, 0, -1), z_dir=(1, 0, 0)), mode=Mode.PRIVATE) as cut_extrude4_sk15:
        with BuildLine():
            ThreePointArc((59.5, 15), (58.767766953, 16.767766953), (57, 17.5))
            Line((57, 17.5), (57, 15))
            Line((57, 15), (54.5, 15))
            ThreePointArc((54.5, 15), (57, 12.5), (59.5, 15))
        make_face()
    cut_extrude4_tool15 = extrude(cut_extrude4_sk15.sketch, amount=-CUT_EXTRUDE4_REACH, mode=Mode.PRIVATE) & part.part
    # Sketch8 → Cut-Extrude4 (cut, up to next)
    with BuildSketch(Plane(origin=(-82, 0, 0), x_dir=(0, 0, -1), z_dir=(1, 0, 0)), mode=Mode.PRIVATE) as cut_extrude4_sk16:
        with BuildLine():
            Line((57, 15), (57, 17.5))
            ThreePointArc((57, 17.5), (55.232233047, 16.767766953), (54.5, 15))
            Line((54.5, 15), (57, 15))
        make_face()
    cut_extrude4_tool16 = extrude(cut_extrude4_sk16.sketch, amount=-CUT_EXTRUDE4_REACH, mode=Mode.PRIVATE) & part.part
    # Sketch8 → Cut-Extrude4 (cut, up to next)
    with BuildSketch(Plane(origin=(-82, 0, 0), x_dir=(0, 0, -1), z_dir=(1, 0, 0)), mode=Mode.PRIVATE) as cut_extrude4_sk17:
        with BuildLine():
            Line((-60.25, 94.75), (-60.25, 27.25))
            ThreePointArc((-60.25, 27.25), (-58.492640687, 23.007359313), (-54.25, 21.25))
            Line((-54.25, 21.25), (54.25, 21.25))
            ThreePointArc((54.25, 21.25), (58.492640687, 23.007359313), (60.25, 27.25))
            Line((60.25, 27.25), (60.25, 94.75))
            ThreePointArc((60.25, 94.75), (58.492640687, 98.992640687), (54.25, 100.75))
            Line((54.25, 100.75), (-54.25, 100.75))
            ThreePointArc((-54.25, 100.75), (-58.492640687, 98.992640687), (-60.25, 94.75))
        make_face()
    cut_extrude4_tool17 = extrude(cut_extrude4_sk17.sketch, amount=-CUT_EXTRUDE4_REACH, mode=Mode.PRIVATE) & part.part
    add(cut_extrude4_tool1.solids().sort_by_distance((-82, 107.353678, 57.353678))[0], mode=Mode.SUBTRACT)
    add(cut_extrude4_tool2.solids().sort_by_distance((-82, 105.938967, 55.938967))[0], mode=Mode.SUBTRACT)
    add(cut_extrude4_tool3.solids().sort_by_distance((-82, 107.353678, 57.353678))[0], mode=Mode.SUBTRACT)
    add(cut_extrude4_tool4.solids().sort_by_distance((-82, 105.938967, 55.938967))[0], mode=Mode.SUBTRACT)
    add(cut_extrude4_tool5.solids().sort_by_distance((-82, 107.353678, -57.353678))[0], mode=Mode.SUBTRACT)
    add(cut_extrude4_tool6.solids().sort_by_distance((-82, 105.938967, -55.938967))[0], mode=Mode.SUBTRACT)
    add(cut_extrude4_tool7.solids().sort_by_distance((-82, 107.353678, -57.353678))[0], mode=Mode.SUBTRACT)
    add(cut_extrude4_tool8.solids().sort_by_distance((-82, 105.938967, -55.938967))[0], mode=Mode.SUBTRACT)
    add(cut_extrude4_tool9.solids().sort_by_distance((-82, 16.061033, 55.938967))[0], mode=Mode.SUBTRACT)
    add(cut_extrude4_tool10.solids().sort_by_distance((-82, 14.646322, 57.353678))[0], mode=Mode.SUBTRACT)
    add(cut_extrude4_tool11.solids().sort_by_distance((-82, 16.061033, 55.938967))[0], mode=Mode.SUBTRACT)
    add(cut_extrude4_tool12.solids().sort_by_distance((-82, 14.646322, 57.353678))[0], mode=Mode.SUBTRACT)
    add(cut_extrude4_tool13.solids().sort_by_distance((-82, 14.646322, -57.353678))[0], mode=Mode.SUBTRACT)
    add(cut_extrude4_tool14.solids().sort_by_distance((-82, 16.061033, -55.938967))[0], mode=Mode.SUBTRACT)
    add(cut_extrude4_tool15.solids().sort_by_distance((-82, 14.646322, -57.353678))[0], mode=Mode.SUBTRACT)
    add(cut_extrude4_tool16.solids().sort_by_distance((-82, 16.061033, -55.938967))[0], mode=Mode.SUBTRACT)
    add(cut_extrude4_tool17.solids().sort_by_distance((-82, 61, 0))[0], mode=Mode.SUBTRACT)


solid = part.part
